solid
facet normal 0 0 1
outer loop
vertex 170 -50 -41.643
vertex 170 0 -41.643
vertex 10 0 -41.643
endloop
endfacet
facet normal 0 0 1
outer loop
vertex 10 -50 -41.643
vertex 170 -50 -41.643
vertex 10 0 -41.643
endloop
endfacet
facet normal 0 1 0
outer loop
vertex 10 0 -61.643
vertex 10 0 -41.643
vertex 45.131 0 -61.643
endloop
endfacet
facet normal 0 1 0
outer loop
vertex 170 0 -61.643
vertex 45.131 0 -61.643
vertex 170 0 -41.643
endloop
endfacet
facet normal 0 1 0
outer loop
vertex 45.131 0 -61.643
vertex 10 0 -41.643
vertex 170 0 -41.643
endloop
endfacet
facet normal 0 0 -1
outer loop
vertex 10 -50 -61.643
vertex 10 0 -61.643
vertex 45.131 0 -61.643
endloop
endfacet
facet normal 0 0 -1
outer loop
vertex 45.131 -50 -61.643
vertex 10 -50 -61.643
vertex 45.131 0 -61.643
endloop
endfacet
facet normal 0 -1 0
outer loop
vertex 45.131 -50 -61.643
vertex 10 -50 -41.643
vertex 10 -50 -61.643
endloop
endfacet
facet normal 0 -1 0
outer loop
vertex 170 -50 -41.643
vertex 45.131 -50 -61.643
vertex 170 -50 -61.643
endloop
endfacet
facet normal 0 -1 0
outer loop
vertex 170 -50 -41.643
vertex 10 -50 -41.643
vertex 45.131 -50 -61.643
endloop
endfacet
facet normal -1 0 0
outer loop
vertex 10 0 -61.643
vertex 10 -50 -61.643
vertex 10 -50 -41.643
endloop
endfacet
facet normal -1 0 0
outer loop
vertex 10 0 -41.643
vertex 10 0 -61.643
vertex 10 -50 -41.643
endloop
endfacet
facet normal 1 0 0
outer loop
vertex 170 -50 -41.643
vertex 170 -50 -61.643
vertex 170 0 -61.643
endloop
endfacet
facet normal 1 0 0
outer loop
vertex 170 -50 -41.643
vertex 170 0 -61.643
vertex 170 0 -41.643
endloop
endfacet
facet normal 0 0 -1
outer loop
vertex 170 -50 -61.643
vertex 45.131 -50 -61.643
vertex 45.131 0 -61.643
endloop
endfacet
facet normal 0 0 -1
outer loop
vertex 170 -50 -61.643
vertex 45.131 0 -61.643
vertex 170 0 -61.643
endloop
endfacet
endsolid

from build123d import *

# Parameters (mm, degrees)
F1_DEPTH = 50
F2_W     = 47.489673
F2_H     = 124.635399
F2_W_2   = 145.976685
F3_DEPTH = 50


with BuildPart() as f1:
    # F0 (on Front) → F1 (new body)
    with BuildSketch(Plane.XZ):
        Polygon((170, -41.64284), (0, -41.64284), (-170, -41.64284), (-170, -169.64284), (-150, -169.64284), (-150, -61.64284), (-30, -61.64284), (0, -61.64284), (30, -61.64284), (150, -61.64284), (150, -169.64284), (170, -169.64284), align=None)
        Polygon((0, -61.64284), (-30, -61.64284), (-30, -169.64284), (0, -169.64284), (30, -169.64284), (30, -61.64284), align=None)
    extrude(amount=F1_DEPTH)

    # F2 (on face) → F3 (cut)
    with BuildSketch(Plane.XZ.offset(50)):
        Polygon((10, -41.64284), (-180.508152, -41.64284), (-180.508152, -61.64284), (-133.018479, -61.64284), (10, -61.64284), align=None)
        with Locations((-156.763315, -123.960539)):
            Rectangle(F2_W, F2_H)
        Polygon((45.131274, -61.64284), (10, -61.64284), (-133.018479, -61.64284), (-133.018479, -186.278239), (45.131274, -186.278239), align=None)
        with Locations((118.119616, -123.960539)):
            Rectangle(F2_W_2, F2_H)
    extrude(amount=-F3_DEPTH, mode=Mode.SUBTRACT)


solid = f1.part
